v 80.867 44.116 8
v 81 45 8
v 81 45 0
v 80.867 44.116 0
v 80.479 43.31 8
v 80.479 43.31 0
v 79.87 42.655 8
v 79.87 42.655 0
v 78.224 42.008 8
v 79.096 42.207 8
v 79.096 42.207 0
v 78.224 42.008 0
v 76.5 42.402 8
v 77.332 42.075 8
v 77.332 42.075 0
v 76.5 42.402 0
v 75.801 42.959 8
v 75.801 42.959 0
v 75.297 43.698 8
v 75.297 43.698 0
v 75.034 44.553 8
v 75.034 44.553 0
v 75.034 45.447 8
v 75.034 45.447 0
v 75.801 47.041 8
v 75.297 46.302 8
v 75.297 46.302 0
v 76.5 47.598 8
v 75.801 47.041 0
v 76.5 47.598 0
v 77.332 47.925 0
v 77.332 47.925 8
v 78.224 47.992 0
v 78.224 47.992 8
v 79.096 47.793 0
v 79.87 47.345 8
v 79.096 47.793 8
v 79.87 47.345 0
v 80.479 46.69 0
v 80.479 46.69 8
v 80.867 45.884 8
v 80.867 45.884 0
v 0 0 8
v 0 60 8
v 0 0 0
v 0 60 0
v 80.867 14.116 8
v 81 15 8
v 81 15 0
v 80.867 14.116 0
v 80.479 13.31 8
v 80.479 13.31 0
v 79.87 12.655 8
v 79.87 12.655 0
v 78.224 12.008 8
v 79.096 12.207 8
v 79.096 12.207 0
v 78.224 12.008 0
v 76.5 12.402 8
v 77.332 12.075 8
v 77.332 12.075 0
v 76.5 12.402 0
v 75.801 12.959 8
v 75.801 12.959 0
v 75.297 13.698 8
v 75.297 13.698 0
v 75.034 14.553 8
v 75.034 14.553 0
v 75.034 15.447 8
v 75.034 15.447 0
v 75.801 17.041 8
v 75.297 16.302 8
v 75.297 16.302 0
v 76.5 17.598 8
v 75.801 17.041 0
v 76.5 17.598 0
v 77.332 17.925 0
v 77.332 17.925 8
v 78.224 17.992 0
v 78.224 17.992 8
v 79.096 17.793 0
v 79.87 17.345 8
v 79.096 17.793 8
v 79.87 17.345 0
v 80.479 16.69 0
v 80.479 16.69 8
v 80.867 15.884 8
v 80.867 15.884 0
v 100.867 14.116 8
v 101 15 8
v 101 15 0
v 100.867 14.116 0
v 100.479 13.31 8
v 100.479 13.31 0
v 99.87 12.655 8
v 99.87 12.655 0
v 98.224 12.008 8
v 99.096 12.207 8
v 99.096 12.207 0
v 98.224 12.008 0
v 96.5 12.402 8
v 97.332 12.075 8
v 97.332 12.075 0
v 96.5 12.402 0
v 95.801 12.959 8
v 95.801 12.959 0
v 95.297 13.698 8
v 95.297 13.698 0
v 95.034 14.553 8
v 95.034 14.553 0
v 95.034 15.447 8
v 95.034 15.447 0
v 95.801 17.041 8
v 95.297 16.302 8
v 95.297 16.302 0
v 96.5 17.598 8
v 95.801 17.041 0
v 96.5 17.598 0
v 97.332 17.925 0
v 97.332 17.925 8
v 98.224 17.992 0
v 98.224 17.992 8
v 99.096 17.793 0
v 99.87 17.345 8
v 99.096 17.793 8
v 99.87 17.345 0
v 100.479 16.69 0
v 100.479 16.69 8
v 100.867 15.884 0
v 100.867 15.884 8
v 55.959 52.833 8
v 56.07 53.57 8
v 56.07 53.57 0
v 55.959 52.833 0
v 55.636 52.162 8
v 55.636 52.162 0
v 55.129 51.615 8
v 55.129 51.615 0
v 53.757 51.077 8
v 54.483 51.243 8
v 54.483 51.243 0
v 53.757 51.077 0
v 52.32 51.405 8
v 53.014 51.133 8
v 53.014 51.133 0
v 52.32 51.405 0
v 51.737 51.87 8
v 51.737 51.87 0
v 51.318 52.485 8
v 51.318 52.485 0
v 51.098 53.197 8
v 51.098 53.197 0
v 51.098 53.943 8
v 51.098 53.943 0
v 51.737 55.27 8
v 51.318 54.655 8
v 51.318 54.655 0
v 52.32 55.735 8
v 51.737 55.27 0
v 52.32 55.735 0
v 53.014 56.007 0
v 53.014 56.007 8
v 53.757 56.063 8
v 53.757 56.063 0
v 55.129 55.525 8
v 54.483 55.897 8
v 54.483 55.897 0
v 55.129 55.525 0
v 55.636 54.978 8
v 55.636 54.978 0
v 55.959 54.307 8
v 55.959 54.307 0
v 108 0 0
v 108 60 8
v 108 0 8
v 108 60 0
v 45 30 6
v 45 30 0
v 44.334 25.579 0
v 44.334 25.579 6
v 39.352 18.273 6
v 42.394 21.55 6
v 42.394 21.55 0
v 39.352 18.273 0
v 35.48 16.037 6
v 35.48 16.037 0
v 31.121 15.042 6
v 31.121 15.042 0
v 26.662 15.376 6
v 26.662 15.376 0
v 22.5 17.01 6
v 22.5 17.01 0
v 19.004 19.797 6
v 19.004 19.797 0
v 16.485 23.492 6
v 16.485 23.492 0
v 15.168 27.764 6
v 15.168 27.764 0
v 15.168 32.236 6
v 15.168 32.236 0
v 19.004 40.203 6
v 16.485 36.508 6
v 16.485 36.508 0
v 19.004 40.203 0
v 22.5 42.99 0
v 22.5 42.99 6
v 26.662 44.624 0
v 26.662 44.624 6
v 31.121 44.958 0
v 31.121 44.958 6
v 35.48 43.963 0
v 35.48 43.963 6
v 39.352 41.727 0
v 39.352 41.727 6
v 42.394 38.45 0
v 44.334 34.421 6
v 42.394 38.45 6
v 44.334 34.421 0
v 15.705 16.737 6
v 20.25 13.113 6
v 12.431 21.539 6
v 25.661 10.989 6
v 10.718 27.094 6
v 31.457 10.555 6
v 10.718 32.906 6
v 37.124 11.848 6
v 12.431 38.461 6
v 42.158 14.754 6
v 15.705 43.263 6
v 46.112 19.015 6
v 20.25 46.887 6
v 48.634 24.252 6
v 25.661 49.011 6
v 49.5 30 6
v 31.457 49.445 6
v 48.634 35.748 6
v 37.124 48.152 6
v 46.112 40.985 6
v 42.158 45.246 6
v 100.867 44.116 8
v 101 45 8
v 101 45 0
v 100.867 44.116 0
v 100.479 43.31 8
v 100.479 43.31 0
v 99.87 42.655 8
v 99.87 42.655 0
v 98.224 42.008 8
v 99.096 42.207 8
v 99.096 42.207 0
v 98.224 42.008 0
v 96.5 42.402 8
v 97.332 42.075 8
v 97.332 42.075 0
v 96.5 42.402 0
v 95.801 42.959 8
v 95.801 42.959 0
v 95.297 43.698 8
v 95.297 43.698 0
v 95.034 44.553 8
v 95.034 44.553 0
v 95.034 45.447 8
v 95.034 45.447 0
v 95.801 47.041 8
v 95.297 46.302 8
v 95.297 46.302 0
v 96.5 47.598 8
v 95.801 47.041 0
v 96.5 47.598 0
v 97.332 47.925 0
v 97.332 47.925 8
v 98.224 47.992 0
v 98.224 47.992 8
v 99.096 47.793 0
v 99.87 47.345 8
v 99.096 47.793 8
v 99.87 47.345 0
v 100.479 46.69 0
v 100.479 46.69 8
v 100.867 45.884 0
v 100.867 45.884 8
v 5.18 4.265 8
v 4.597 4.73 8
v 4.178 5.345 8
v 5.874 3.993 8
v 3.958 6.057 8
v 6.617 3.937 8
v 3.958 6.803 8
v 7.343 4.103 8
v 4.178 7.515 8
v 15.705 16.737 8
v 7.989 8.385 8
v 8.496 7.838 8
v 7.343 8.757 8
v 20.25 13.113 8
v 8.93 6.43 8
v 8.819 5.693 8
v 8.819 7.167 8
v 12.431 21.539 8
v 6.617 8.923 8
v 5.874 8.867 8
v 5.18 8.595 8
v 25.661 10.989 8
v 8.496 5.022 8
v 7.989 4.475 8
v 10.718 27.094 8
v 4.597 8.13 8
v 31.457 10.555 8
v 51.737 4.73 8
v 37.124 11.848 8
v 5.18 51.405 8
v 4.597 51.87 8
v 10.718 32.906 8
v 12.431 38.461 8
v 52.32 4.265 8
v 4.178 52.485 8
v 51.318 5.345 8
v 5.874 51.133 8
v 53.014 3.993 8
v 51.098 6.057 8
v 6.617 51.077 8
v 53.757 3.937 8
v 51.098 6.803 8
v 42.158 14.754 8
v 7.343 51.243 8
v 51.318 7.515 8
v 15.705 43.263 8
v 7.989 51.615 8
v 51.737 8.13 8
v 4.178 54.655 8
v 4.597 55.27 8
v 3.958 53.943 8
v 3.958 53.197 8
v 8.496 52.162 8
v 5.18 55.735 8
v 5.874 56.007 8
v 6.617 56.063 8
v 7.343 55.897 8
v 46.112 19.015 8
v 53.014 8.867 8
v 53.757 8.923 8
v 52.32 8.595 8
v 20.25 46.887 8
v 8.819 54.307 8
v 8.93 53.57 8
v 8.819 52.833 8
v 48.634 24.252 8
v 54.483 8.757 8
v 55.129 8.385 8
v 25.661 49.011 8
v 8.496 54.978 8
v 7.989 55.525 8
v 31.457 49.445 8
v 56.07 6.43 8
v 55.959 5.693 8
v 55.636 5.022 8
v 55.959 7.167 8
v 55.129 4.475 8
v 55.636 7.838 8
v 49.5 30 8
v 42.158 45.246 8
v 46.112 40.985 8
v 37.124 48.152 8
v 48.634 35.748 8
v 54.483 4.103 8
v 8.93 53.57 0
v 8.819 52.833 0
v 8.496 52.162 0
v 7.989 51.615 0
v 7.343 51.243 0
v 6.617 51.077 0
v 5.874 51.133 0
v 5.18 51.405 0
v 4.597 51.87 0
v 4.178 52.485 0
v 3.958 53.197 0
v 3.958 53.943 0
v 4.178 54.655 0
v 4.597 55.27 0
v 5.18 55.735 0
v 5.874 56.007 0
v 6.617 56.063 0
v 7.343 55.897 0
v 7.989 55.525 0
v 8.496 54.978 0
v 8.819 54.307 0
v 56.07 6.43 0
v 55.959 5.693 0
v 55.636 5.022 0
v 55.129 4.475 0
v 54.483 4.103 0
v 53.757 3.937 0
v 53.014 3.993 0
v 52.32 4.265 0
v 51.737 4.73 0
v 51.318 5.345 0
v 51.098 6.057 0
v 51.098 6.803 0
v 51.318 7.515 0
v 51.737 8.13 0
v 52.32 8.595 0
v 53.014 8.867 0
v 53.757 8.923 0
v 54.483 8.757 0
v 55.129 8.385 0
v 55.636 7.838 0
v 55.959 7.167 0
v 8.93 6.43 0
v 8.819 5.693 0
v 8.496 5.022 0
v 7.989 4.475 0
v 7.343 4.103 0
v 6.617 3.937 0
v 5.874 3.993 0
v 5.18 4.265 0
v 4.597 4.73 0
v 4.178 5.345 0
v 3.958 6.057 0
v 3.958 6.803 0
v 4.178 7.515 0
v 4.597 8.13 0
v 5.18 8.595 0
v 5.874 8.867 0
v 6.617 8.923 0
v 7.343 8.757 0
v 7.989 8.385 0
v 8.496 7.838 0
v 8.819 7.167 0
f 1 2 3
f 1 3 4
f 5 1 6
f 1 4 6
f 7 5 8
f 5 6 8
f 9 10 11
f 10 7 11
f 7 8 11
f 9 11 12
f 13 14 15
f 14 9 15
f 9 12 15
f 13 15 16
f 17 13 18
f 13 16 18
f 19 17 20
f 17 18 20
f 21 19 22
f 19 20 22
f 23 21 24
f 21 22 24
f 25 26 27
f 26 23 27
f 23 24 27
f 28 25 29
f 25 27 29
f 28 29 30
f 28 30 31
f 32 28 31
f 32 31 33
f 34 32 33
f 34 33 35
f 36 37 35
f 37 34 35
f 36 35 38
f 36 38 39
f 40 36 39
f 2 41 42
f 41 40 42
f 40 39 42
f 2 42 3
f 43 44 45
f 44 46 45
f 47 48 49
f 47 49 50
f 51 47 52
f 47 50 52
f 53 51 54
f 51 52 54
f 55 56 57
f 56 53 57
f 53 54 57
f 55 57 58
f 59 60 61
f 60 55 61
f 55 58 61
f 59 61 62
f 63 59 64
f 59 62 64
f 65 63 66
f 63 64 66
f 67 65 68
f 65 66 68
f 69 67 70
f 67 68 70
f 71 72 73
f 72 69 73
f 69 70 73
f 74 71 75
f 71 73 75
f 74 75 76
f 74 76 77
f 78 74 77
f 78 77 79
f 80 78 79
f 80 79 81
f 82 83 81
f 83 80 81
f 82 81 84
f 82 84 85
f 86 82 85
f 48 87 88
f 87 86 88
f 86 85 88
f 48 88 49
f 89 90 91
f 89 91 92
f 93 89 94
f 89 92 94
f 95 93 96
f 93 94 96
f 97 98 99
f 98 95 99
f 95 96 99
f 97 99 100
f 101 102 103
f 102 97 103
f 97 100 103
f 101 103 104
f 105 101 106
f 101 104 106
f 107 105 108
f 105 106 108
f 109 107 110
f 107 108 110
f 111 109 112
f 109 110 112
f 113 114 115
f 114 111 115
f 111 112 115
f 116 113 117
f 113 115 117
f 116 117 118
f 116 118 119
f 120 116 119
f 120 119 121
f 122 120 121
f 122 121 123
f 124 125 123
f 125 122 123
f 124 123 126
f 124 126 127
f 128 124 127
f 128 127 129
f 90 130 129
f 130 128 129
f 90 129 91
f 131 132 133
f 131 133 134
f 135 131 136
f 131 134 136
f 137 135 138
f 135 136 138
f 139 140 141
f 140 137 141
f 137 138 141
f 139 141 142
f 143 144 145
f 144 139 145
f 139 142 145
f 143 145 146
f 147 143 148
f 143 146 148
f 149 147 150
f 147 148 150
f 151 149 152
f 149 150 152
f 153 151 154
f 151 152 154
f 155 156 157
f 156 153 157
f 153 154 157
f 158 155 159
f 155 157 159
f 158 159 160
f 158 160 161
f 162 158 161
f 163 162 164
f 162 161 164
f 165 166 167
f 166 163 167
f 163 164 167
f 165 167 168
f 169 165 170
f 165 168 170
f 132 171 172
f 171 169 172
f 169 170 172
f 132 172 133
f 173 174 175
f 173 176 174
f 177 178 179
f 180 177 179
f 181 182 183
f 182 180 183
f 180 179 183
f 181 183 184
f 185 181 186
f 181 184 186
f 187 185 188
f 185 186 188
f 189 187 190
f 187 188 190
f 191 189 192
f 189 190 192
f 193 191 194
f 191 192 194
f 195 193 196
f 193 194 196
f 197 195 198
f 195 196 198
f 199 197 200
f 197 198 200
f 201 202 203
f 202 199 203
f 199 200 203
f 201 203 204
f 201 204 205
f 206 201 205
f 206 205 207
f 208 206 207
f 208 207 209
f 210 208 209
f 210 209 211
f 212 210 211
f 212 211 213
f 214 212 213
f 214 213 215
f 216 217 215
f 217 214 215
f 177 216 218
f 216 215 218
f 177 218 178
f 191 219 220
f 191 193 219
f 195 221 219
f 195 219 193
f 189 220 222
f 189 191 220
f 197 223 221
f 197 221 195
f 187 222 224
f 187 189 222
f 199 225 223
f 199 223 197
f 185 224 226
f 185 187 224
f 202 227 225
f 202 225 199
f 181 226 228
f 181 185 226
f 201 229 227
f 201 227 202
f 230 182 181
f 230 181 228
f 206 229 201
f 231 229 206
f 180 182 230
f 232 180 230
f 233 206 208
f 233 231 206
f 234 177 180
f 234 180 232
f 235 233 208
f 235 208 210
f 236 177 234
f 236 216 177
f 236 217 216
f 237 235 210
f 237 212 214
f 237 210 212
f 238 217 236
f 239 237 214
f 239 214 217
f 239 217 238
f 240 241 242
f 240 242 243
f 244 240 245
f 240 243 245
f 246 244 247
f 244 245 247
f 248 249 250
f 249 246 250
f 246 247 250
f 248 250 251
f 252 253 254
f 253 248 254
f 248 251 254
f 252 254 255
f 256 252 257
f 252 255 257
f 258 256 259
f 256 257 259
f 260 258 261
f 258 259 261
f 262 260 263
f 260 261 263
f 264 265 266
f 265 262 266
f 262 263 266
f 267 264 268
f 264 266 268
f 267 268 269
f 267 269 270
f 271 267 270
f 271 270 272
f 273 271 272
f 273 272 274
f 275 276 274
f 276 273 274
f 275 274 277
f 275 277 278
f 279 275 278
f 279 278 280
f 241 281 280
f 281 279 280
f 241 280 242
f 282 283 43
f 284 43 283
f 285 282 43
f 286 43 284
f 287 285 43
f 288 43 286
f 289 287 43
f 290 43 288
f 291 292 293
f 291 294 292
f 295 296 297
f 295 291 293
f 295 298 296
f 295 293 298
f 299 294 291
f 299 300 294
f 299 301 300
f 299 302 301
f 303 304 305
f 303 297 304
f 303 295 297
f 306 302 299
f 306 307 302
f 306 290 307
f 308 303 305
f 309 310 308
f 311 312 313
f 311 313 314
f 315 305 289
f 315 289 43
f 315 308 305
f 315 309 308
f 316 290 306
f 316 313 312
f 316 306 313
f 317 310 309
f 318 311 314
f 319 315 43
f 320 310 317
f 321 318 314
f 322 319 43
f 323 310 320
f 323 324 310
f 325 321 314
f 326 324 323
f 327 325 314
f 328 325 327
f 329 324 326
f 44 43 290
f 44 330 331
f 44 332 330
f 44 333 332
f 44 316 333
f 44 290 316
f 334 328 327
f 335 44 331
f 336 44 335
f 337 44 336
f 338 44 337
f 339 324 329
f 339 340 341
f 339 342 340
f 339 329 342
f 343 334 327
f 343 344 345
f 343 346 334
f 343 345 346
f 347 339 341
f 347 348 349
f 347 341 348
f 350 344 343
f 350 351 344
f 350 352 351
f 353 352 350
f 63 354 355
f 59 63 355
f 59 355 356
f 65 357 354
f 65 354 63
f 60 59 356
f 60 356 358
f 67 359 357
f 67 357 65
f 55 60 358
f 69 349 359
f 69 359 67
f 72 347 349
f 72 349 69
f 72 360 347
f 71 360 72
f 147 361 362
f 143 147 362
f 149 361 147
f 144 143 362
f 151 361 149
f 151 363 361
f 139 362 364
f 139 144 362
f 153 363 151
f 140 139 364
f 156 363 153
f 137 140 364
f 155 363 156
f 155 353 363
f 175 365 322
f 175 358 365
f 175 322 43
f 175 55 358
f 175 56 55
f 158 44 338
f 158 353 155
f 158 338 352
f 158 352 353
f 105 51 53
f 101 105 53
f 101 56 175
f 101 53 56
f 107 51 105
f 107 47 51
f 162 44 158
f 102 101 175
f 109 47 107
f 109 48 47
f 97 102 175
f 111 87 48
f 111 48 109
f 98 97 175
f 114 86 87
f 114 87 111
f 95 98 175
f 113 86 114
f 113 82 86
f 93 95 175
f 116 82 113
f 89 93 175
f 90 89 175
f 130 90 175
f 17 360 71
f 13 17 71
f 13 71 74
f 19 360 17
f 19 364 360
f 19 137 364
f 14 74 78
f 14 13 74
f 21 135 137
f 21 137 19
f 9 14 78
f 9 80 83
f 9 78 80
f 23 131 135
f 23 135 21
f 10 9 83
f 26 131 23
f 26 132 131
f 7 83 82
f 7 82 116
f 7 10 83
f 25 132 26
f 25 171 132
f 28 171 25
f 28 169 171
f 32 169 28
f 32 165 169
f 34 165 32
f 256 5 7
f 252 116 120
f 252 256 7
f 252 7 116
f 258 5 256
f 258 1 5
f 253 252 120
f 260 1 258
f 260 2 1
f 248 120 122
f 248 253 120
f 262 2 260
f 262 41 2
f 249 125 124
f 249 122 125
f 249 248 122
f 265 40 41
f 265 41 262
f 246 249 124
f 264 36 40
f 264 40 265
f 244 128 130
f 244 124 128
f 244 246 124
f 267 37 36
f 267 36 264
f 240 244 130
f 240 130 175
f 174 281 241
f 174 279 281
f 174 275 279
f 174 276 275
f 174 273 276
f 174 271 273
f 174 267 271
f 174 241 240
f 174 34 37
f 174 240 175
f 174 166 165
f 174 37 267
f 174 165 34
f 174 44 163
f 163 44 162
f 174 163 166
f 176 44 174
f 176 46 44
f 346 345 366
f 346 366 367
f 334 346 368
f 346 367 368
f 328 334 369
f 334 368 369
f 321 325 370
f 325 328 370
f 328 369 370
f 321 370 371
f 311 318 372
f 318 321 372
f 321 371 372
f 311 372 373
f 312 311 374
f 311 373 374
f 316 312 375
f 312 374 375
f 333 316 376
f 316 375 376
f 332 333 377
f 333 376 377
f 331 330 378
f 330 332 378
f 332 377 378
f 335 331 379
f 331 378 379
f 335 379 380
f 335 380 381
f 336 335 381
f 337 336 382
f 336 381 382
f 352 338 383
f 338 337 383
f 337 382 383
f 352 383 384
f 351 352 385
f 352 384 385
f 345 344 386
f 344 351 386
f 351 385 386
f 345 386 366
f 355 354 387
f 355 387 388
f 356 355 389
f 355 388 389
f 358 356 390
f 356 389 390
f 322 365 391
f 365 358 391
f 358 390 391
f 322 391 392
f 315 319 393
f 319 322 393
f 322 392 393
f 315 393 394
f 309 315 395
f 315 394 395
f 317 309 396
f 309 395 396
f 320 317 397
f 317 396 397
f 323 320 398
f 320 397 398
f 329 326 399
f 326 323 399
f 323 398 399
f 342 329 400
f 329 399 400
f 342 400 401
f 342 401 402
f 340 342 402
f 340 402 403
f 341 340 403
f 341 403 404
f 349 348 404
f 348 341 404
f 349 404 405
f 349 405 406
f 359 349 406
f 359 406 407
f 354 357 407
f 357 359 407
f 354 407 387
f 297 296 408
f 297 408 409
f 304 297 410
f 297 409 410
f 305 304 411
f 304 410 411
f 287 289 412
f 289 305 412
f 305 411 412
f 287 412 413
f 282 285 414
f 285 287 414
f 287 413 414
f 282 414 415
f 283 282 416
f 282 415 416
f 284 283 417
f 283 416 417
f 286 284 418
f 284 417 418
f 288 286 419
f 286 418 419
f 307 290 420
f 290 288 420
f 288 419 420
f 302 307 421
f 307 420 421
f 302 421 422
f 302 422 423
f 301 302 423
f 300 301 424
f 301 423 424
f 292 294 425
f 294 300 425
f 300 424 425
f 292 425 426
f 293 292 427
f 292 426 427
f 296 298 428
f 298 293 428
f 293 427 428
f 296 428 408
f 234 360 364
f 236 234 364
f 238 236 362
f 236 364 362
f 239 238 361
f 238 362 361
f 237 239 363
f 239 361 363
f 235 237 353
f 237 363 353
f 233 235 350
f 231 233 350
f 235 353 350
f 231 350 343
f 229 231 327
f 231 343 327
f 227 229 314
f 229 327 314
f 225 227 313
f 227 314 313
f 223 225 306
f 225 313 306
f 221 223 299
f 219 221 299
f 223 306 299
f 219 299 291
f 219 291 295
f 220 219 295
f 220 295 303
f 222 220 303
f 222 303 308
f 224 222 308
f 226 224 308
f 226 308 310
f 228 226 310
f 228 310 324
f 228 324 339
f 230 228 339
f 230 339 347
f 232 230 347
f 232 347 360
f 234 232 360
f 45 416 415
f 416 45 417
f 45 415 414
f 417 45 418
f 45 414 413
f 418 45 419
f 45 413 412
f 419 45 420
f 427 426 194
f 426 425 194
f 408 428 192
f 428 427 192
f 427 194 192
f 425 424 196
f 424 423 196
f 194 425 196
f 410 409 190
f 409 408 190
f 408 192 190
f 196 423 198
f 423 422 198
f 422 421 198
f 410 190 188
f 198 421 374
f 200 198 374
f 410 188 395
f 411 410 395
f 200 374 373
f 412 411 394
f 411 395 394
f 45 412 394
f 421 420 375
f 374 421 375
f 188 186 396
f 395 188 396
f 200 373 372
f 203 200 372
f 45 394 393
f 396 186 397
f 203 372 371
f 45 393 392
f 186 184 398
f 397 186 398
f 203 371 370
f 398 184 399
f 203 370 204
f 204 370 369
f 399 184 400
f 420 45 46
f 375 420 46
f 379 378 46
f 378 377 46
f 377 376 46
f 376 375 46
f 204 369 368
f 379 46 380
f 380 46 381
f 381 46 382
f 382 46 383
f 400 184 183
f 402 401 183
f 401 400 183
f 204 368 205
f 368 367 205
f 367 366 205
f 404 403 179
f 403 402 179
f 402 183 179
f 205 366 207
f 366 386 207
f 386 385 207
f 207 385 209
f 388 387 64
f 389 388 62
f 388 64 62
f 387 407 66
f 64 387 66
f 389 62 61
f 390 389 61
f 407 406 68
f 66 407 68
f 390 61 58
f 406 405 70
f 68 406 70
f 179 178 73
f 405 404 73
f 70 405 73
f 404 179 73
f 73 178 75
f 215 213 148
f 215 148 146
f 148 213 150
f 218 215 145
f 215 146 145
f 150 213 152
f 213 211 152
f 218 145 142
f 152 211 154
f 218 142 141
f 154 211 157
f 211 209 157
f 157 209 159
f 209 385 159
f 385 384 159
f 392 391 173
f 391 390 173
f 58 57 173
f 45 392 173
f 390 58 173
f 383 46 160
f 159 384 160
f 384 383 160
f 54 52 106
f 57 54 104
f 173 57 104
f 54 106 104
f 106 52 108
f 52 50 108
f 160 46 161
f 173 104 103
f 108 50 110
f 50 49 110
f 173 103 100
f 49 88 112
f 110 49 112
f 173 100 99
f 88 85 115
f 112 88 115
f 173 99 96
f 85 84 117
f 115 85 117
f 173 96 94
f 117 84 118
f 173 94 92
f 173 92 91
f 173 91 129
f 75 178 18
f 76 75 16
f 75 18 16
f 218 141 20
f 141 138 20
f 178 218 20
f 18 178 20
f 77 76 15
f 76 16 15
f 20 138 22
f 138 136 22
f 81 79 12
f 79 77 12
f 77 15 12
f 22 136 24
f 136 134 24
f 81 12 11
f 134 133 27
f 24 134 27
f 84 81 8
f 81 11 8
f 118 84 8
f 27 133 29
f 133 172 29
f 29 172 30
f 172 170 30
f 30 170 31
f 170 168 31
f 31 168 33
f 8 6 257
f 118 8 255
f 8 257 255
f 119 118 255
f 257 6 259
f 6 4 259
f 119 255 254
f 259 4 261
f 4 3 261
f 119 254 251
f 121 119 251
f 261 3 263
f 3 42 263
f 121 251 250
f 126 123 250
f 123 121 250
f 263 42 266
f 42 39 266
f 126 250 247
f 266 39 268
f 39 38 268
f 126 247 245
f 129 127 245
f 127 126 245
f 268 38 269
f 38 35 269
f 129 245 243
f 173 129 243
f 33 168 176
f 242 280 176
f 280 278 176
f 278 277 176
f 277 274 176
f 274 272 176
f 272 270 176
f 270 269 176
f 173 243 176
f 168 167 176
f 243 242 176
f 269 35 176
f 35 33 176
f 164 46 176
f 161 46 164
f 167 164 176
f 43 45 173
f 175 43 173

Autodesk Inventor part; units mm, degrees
ref_plane "YZ Plane" through (0, 0, 0) normal (1, 0, 0) x (0, 1, 0)
ref_plane "XZ Plane" through (0, 0, 0) normal (0, 1, 0) x (-1, 0, 0)
ref_plane "XY Plane" through (0, 0, 0) normal (0, 0, 1) x (1, 0, 0)
sketch "Szkic1" plane through (0, 0, 0) normal (0, 0, 1) x (1, 0, 0)
  circle A0 centre (30, 30) radius 15
  circle A1 centre (53.57, 6.43) radius 2.5
  circle A2 centre (6.43, 53.57) radius 2.5
  circle A3 centre (6.43, 6.43) radius 2.5
  circle A4 centre (53.57, 53.57) radius 2.5
  line L0 (0, 60) -> (0, 0)
  line L1 (0, 0) -> (78, 0)
  circle A5 centre (78, 45) radius 3
  circle A6 centre (98, 45) radius 3
  circle A7 centre (98, 15) radius 3
  circle A8 centre (78, 15) radius 3
  line L2 (108, 60) -> (108, 0)
  line L3 (0, 60) -> (108, 60)
  line L4 (108, 0) -> (78, 0)
  point P0 (35, 30)
  dimension "d12" = 6.43
  dimension "d13" = 6.43
  dimension "d14" = 47.14
  dimension "d15" = 47.14
  dimension "d16" = 30
  dimension "d17" = 10
  dimension "d18" = 10
  dimension "d19" = 30
  dimension "d20" = 30
  dimension "d21" = 108
extrude "Wyciągnięcie proste1" add sketch "Szkic1" along normal blind 8
thread "Gwint1" size "M5x0.8" class "6H" standard "ANSI Metric M Profile" full length
thread "Gwint2" size "M5x0.8" class "6H" standard "ANSI Metric M Profile" full length
thread "Gwint3" size "M5x0.8" class "6H" standard "ANSI Metric M Profile" full length
thread "Gwint4" size "M5x0.8" class "6H" standard "ANSI Metric M Profile" full length
sketch "Szkic2" plane through (0, 0, 8) normal (0, 0, 1) x (1, 0, 0)
  circle A0 centre (30, 30) radius 19.5
  circle A1 centre (53.57, 53.57) radius 2.5
  circle A2 centre (6.43, 6.43) radius 2.5
  circle A3 centre (6.43, 53.57) radius 2.5
  circle A4 centre (53.57, 6.43) radius 2.5
  line L0 (70, 60) -> (70, 0)
  line L1 (0, 60) -> (70, 60)
  line L2 (0, 0) -> (0, 60)
  line L3 (70, 0) -> (0, 0)
  circle A5 centre (30, 30) radius 15
  circle A6 centre (30, 30) radius 19.5
  circle A7 centre (30, 30) radius 15 projected
  circle A8 centre (78, 15) radius 3 projected
  circle A9 centre (98, 15) radius 3 projected
  circle A10 centre (98, 45) radius 3 projected
  circle A11 centre (78, 45) radius 3 projected
  circle A12 centre (53.57, 53.57) radius 2.5 projected
  circle A13 centre (6.43, 6.43) radius 2.5 projected
  circle A14 centre (6.43, 53.57) radius 2.5 projected
  circle A15 centre (53.57, 6.43) radius 2.5 projected
  line L4 (0, 60) -> (0, 0) projected
  line L5 (0, 0) -> (108, 0) projected
  line L6 (108, 0) -> (108, 60) projected
  line L7 (108, 60) -> (0, 60) projected
  point P0 (35, 30)
extrude "Wyciągnięcie proste2" cut sketch "Szkic2" against normal blind 2 contours A0
properties part number "Uchwyt silnika krokowego osi Y - płaski"
